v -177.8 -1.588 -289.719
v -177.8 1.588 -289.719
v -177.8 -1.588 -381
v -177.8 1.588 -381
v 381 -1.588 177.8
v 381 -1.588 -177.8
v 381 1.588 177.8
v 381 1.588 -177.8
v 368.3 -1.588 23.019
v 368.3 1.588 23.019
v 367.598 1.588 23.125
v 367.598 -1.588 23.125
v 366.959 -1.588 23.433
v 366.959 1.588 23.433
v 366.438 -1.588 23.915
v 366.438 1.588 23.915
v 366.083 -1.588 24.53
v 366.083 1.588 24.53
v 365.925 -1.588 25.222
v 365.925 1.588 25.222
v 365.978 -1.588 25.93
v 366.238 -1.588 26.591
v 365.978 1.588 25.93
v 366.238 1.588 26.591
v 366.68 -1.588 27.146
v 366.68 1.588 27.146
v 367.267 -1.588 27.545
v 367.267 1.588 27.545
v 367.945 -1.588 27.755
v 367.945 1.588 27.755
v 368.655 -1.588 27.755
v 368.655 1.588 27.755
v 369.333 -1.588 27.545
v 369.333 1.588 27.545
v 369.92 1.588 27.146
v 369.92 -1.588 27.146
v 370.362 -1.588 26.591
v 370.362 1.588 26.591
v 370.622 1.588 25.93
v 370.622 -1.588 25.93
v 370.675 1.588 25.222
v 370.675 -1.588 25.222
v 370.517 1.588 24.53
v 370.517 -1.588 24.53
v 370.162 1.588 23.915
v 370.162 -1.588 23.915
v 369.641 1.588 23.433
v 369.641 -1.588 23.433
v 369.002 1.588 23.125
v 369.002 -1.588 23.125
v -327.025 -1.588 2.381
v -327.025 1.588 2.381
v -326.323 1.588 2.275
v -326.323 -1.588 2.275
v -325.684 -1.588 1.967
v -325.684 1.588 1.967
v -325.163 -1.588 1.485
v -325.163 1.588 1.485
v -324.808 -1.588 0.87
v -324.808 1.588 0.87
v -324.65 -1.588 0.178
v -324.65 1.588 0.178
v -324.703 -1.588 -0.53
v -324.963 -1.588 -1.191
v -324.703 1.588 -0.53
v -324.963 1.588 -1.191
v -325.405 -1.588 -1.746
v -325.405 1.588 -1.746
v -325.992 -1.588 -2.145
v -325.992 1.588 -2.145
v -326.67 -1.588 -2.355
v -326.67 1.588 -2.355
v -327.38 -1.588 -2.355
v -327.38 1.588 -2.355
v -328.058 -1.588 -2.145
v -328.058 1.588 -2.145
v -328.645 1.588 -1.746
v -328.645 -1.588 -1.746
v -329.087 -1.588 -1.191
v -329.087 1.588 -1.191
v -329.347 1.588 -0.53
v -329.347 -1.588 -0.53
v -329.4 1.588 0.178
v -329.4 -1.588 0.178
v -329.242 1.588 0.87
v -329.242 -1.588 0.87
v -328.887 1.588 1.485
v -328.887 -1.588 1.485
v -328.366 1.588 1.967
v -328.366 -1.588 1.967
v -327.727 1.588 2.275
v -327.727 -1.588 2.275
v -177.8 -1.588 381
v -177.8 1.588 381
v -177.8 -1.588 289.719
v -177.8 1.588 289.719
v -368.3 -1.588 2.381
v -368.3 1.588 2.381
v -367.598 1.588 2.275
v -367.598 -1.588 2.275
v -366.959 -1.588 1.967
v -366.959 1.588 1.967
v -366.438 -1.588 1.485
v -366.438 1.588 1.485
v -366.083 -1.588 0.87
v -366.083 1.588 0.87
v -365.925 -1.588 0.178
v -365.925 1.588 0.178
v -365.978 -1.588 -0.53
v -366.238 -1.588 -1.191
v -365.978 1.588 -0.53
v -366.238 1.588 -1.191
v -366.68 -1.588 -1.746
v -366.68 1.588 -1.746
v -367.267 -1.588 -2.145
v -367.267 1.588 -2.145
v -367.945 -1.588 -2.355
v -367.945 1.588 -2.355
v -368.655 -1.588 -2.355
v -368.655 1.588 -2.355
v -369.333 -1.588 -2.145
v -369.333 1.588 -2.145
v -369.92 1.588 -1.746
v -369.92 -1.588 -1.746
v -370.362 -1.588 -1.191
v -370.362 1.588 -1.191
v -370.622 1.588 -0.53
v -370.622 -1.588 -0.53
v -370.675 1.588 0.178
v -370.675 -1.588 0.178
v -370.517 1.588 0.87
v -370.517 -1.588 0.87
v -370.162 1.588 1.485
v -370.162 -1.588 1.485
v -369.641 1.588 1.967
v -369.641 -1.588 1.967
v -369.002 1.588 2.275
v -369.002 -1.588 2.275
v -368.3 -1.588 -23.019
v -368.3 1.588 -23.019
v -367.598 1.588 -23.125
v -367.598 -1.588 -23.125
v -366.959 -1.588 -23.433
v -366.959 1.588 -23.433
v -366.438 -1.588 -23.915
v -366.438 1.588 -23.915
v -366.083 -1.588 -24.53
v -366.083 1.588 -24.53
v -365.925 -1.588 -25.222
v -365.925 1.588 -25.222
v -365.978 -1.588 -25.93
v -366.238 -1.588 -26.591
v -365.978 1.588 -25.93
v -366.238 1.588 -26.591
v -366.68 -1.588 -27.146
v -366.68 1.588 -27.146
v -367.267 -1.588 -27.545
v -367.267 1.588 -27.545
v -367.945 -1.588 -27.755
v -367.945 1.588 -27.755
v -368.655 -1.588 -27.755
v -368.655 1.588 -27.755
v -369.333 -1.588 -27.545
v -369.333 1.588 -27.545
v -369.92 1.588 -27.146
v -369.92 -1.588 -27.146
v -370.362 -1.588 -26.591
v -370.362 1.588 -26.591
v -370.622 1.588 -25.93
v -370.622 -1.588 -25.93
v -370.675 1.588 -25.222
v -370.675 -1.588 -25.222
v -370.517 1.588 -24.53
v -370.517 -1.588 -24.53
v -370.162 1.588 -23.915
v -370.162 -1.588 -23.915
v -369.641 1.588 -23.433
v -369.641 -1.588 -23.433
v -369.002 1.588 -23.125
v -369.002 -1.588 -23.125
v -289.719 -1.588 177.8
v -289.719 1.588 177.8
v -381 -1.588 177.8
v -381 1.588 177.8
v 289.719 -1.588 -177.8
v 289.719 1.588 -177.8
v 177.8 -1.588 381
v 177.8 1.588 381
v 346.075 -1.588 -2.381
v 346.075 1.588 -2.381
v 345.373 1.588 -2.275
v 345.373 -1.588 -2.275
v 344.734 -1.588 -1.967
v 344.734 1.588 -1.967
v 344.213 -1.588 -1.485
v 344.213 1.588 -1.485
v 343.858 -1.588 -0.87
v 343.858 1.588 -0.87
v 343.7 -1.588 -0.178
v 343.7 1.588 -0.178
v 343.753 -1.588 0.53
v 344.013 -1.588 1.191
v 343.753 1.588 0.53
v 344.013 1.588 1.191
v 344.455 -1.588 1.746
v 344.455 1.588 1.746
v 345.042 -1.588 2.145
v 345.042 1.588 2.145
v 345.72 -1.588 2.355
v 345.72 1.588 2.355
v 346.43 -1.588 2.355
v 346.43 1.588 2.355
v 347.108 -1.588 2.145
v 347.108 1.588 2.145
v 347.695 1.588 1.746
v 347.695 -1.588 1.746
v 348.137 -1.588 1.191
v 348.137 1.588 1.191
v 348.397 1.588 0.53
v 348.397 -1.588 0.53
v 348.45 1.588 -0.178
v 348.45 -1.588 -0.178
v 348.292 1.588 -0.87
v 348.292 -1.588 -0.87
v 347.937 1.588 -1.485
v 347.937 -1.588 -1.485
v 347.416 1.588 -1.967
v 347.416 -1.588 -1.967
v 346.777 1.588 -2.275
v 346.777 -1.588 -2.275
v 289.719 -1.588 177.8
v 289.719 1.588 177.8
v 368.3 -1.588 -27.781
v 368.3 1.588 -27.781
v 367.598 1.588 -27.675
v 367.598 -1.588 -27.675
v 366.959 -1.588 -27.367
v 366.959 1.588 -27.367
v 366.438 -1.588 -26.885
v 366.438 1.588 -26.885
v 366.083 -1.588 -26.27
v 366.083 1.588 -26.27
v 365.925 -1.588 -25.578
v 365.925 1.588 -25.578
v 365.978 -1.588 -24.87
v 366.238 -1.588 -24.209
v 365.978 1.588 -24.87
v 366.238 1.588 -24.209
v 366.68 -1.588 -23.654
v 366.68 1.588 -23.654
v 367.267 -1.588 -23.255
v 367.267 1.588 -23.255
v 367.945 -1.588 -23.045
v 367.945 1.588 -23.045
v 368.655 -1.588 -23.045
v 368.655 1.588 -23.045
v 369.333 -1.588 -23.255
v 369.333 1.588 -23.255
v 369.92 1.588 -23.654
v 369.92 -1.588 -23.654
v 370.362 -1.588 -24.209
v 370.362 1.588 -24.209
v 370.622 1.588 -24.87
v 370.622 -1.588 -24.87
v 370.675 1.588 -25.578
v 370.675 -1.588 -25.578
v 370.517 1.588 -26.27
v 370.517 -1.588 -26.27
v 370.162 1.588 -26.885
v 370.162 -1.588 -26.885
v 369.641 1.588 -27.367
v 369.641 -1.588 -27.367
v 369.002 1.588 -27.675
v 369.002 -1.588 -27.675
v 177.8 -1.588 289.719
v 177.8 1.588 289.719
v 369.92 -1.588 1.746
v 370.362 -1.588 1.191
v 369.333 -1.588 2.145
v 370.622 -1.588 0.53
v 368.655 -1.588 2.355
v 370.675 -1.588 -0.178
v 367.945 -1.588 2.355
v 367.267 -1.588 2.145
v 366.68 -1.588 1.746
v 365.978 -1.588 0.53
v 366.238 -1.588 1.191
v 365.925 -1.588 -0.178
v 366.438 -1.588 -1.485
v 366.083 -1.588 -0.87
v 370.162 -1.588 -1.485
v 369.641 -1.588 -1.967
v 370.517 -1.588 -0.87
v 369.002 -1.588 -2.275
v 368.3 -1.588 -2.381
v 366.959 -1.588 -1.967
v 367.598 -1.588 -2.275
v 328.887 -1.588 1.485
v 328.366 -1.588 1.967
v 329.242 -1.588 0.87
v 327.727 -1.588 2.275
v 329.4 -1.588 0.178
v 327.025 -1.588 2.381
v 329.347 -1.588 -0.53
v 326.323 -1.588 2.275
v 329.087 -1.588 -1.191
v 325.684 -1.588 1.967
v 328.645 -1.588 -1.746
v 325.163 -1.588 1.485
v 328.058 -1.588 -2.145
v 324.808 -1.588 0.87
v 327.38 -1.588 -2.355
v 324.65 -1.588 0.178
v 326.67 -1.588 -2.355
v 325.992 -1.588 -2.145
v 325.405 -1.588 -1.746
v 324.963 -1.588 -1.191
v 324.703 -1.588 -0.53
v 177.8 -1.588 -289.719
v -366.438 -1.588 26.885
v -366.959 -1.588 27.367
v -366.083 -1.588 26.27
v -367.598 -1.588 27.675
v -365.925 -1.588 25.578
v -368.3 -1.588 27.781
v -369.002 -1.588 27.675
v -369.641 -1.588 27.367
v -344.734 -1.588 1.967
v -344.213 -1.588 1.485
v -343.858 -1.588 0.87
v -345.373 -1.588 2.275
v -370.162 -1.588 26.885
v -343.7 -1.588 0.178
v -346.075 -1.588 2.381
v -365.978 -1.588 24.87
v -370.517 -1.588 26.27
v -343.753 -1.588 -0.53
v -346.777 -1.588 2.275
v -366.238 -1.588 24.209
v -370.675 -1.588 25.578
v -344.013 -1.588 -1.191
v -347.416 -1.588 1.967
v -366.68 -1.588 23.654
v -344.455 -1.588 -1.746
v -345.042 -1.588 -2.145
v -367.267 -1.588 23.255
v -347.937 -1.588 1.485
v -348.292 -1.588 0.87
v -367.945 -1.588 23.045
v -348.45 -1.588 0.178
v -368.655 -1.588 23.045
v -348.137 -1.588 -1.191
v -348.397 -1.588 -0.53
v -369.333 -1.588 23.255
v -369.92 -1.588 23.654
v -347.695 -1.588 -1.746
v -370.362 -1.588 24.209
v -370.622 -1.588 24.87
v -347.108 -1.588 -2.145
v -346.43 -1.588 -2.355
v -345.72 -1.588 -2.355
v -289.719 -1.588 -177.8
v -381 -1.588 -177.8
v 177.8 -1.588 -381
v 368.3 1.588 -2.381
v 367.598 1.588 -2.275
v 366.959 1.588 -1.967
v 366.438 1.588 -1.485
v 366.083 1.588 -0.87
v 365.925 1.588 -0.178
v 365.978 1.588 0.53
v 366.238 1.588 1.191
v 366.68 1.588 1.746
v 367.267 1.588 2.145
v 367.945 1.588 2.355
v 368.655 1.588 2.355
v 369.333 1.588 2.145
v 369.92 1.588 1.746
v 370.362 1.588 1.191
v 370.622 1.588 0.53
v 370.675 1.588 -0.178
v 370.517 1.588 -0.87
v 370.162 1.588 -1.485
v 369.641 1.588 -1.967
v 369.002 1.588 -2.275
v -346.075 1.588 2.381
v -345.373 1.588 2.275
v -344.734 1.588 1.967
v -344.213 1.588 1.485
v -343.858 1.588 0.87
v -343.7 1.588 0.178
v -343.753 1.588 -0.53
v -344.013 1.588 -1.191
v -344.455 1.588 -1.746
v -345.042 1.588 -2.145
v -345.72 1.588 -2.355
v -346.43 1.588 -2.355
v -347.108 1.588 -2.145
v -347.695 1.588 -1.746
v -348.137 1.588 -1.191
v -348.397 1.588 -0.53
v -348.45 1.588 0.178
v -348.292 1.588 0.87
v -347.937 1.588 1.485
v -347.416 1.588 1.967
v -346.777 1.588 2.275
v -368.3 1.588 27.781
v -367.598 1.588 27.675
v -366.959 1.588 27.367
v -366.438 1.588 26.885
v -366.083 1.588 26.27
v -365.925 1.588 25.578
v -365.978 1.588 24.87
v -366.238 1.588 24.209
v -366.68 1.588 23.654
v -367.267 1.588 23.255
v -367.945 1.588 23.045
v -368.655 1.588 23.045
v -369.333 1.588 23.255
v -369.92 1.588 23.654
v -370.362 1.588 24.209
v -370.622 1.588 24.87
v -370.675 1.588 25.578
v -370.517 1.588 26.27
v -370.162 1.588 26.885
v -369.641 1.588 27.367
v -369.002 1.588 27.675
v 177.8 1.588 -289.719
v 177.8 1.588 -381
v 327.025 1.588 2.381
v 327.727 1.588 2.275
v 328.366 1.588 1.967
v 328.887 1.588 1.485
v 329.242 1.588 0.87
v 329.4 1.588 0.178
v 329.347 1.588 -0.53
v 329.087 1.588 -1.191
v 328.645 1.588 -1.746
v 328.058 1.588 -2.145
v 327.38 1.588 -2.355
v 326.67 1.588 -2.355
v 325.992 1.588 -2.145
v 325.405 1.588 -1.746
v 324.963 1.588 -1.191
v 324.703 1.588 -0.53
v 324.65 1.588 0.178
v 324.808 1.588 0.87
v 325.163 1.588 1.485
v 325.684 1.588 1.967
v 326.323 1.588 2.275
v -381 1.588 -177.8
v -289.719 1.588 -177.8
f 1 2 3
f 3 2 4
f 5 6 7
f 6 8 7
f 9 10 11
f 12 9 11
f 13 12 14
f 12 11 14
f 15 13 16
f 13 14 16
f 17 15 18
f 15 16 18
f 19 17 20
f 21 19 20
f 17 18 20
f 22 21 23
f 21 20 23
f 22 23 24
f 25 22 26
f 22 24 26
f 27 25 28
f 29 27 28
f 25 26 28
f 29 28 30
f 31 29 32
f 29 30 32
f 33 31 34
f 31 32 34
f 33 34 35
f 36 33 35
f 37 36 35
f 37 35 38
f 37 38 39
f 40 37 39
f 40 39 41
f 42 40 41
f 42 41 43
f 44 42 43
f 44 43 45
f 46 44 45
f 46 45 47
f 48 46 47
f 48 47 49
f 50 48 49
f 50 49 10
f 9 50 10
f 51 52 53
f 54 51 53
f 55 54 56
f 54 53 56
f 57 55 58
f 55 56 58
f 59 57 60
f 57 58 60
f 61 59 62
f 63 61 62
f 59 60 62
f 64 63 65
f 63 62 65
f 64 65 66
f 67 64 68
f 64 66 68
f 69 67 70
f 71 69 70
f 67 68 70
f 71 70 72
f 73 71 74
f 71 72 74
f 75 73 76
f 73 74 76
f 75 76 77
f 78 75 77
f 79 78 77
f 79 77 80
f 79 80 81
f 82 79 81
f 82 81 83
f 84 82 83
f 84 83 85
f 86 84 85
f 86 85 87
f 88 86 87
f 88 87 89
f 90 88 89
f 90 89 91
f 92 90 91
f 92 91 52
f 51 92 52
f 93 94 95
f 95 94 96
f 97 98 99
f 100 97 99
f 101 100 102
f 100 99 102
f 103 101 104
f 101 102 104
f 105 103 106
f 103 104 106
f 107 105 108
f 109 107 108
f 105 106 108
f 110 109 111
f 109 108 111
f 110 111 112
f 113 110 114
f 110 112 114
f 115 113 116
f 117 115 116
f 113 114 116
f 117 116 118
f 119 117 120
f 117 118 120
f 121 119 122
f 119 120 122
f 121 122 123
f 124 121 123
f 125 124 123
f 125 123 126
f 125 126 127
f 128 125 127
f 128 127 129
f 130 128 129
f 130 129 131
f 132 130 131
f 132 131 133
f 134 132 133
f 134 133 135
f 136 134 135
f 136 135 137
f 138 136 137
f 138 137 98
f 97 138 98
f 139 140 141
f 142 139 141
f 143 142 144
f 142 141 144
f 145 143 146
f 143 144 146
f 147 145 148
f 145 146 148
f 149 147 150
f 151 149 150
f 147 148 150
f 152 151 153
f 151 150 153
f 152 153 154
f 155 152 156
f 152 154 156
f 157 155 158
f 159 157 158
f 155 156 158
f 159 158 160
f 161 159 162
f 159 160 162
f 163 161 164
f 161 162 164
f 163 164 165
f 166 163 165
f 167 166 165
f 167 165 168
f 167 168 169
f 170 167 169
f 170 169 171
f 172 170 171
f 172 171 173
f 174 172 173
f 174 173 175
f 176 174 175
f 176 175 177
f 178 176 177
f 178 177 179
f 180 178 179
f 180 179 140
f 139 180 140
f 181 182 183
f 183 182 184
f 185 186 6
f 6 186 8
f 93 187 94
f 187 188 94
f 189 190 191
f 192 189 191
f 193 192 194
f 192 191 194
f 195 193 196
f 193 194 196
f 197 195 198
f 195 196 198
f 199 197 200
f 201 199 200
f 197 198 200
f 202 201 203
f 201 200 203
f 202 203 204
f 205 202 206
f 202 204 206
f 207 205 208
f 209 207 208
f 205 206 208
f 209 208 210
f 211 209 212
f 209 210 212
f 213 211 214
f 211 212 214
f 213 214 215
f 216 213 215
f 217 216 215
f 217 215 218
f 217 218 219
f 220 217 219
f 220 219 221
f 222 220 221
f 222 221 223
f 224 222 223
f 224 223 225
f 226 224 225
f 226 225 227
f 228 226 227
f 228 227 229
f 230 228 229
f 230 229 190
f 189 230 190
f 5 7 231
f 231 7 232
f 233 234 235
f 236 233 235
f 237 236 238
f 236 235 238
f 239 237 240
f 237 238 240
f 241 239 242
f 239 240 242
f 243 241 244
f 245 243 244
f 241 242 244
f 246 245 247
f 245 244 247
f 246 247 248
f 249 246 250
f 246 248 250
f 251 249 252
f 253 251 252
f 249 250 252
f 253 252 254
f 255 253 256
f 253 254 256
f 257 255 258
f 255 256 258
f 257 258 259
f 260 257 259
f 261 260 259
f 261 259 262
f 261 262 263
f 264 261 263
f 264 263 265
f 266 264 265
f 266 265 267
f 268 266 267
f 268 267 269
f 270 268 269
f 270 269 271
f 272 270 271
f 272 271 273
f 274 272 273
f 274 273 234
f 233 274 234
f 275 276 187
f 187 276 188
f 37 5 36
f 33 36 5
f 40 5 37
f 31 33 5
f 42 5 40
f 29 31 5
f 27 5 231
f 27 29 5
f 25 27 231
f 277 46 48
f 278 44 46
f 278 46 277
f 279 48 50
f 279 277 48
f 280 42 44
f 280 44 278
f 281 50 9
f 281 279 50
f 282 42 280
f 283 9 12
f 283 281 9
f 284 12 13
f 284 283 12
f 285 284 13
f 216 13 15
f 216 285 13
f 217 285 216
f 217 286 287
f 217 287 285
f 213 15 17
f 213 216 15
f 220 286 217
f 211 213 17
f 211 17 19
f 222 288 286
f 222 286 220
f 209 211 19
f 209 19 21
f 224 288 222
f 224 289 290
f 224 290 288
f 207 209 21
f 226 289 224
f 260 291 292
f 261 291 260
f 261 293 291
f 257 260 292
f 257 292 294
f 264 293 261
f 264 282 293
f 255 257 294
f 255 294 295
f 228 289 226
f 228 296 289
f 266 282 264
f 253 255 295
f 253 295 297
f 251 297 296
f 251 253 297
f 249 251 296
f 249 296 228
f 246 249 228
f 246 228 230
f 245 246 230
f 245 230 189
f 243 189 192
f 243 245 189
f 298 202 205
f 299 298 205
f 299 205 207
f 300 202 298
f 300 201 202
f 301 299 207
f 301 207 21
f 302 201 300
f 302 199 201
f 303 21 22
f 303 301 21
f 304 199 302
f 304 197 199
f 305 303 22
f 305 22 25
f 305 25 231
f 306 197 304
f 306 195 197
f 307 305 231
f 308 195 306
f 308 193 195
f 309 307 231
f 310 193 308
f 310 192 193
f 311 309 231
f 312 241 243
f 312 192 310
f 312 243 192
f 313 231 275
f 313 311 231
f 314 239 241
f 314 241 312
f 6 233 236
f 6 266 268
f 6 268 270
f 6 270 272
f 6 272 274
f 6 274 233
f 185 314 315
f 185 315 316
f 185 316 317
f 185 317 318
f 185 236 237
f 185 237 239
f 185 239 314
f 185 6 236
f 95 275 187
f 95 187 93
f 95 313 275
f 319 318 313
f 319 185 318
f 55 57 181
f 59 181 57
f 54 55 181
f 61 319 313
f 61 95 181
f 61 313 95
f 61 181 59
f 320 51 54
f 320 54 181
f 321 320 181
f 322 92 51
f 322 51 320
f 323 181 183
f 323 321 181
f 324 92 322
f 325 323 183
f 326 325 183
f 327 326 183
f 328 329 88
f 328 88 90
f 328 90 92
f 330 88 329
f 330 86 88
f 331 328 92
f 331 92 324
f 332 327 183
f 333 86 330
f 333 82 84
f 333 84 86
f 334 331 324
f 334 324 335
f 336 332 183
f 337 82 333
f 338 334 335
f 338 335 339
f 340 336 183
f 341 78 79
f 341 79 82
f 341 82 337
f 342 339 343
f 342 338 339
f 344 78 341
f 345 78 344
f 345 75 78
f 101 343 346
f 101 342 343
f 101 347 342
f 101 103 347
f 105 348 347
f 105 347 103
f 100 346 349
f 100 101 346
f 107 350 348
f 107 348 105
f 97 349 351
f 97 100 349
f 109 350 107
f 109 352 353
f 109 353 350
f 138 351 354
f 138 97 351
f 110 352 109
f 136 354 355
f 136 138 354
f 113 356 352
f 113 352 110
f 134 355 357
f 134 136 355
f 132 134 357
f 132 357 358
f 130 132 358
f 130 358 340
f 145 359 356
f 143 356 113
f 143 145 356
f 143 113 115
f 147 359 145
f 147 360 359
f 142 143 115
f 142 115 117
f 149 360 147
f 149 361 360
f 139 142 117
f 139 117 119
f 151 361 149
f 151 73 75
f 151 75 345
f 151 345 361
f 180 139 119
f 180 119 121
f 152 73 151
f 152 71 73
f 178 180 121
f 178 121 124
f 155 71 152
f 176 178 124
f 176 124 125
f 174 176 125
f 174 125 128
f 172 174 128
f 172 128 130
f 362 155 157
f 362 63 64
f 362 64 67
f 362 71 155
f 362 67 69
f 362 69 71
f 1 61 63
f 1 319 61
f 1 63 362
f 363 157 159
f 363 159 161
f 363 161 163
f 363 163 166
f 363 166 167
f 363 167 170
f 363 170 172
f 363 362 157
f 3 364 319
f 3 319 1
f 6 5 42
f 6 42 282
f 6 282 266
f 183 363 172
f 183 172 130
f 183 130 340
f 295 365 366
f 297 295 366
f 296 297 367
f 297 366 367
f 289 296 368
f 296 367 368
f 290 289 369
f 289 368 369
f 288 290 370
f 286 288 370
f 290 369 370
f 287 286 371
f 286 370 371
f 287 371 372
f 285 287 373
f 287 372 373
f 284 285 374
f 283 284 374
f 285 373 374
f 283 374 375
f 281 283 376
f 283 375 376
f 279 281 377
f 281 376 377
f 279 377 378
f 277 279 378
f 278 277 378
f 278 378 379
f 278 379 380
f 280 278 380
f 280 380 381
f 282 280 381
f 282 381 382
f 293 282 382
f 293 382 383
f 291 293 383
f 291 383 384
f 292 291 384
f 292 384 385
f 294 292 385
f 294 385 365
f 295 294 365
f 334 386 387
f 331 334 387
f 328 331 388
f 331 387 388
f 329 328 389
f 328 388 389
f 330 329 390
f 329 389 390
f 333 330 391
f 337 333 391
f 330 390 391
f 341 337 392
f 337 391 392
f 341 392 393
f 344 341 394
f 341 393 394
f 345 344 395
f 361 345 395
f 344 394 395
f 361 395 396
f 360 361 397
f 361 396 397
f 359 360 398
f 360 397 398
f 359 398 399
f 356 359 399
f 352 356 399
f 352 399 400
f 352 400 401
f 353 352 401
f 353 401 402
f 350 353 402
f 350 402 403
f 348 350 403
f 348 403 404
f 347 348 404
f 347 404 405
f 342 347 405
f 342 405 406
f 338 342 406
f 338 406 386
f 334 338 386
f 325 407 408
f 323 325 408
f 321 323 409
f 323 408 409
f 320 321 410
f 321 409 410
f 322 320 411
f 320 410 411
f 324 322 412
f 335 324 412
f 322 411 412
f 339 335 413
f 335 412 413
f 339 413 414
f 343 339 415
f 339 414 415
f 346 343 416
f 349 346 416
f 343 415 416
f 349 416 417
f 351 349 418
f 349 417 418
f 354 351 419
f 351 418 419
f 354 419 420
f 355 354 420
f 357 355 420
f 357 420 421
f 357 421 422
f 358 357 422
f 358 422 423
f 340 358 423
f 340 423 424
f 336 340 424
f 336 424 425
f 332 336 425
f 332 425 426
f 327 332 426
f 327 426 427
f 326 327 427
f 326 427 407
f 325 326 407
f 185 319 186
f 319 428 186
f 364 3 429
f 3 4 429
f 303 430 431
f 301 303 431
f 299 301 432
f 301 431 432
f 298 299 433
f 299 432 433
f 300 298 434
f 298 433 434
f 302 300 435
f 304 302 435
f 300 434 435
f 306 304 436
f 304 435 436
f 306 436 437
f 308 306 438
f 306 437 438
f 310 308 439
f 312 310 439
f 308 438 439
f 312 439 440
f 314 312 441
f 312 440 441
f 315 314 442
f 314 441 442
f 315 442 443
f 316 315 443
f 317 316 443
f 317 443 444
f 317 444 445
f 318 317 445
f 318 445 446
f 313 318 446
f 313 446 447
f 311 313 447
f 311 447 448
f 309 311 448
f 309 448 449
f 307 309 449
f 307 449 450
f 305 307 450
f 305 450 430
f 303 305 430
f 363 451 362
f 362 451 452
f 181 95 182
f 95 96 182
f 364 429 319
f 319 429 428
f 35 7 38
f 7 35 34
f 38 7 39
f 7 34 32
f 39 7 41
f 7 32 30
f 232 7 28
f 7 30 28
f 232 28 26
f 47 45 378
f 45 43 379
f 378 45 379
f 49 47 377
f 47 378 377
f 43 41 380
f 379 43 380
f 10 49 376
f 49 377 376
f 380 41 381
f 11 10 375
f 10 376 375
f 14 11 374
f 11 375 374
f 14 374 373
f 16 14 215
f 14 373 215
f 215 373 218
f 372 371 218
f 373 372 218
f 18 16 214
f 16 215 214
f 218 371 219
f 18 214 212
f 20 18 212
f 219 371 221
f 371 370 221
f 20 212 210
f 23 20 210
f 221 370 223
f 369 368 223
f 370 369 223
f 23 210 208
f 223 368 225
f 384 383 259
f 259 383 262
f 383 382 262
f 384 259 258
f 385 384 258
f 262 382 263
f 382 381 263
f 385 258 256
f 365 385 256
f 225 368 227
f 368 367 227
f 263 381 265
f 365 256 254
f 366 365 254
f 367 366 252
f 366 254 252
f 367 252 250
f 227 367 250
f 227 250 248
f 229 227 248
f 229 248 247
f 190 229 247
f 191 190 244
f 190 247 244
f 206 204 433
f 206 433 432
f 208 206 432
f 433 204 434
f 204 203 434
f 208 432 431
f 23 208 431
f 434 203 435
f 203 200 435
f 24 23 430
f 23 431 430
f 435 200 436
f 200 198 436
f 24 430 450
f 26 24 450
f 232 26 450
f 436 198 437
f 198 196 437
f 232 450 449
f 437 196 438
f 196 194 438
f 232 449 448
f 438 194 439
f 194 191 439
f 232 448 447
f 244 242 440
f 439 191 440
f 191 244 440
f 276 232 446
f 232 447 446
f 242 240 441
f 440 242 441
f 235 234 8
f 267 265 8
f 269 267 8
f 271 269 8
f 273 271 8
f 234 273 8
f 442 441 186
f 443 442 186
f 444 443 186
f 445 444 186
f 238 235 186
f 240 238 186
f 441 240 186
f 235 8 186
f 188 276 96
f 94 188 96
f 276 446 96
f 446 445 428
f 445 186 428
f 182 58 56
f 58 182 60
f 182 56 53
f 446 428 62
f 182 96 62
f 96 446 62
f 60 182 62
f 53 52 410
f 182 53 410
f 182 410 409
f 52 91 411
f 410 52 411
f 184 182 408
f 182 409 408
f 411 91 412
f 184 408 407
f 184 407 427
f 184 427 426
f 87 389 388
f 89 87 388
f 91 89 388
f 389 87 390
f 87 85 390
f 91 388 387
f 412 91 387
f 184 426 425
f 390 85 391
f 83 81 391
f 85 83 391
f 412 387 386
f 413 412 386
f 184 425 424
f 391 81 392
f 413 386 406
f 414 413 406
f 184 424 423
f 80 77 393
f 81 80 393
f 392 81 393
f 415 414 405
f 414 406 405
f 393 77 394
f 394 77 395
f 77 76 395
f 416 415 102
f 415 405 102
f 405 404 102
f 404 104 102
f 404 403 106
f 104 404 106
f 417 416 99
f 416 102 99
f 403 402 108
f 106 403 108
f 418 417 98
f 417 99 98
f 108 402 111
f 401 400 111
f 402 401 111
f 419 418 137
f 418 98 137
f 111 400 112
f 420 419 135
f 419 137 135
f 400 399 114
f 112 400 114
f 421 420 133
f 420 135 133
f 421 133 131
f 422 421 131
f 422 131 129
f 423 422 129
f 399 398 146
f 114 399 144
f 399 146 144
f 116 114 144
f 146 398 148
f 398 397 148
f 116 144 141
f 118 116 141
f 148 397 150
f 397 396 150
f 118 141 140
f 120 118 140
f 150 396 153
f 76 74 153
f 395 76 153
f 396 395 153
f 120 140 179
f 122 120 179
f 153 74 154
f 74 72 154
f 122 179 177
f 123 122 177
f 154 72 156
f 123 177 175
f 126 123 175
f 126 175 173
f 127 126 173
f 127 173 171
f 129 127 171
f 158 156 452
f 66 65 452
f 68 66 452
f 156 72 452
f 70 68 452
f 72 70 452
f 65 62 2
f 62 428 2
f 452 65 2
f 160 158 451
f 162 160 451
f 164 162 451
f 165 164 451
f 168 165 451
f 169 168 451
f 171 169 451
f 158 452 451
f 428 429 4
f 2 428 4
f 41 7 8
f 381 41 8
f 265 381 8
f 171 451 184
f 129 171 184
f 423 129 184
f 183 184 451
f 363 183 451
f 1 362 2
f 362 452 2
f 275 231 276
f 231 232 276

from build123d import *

# Parameters (mm, degrees)
BOSS_EXTRUDE1_DEPTH = 1.5875
SKETCH2_R           = 2.38125
CUT_EXTRUDE1_DEPTH  = 539.824721616


with BuildPart() as part:
    # Sketch1 → Boss-Extrude1 (new, symmetric)
    with BuildSketch(Plane(origin=(0, 0, 0), x_dir=(1, 0, 0), z_dir=(0, 1, 0))):
        Polygon((-381, 177.8), (-289.71875, 177.8), (-177.8, 289.71875), (-177.8, 381), (177.8, 381), (177.8, 289.71875), (289.71875, 177.8), (381, 177.8), (381, -177.8), (289.71875, -177.8), (177.8, -289.71875), (177.8, -381), (-177.8, -381), (-177.8, -289.71875), (-289.71875, -177.8), (-381, -177.8), align=None)
    extrude(amount=BOSS_EXTRUDE1_DEPTH, both=True)

    # Sketch2 → Cut-Extrude1 (cut, through all)
    with BuildSketch(Plane(origin=(0, 1.5875, 0), x_dir=(1, 0, 0), z_dir=(0, 1, 0))):
        with Locations(Location((-346.075, 0, 0), (0, 0, 270))):
            Circle(SKETCH2_R)
        with Locations(Location((-368.3, 0, 0), (0, 0, 270))):
            Circle(SKETCH2_R)
        with Locations(Location((-368.3, 25.4, 0), (0, 0, 270))):
            Circle(SKETCH2_R)
        with Locations(Location((-368.3, -25.4, 0), (0, 0, 270))):
            Circle(SKETCH2_R)
        with Locations(Location((368.3, -25.4, 0), (0, 0, 90))):
            Circle(SKETCH2_R)
        with Locations(Location((368.3, 25.4, 0), (0, 0, 90))):
            Circle(SKETCH2_R)
        with Locations(Location((368.3, 0, 0), (0, 0, 90))):
            Circle(SKETCH2_R)
        with Locations(Location((346.075, 0, 0), (0, 0, 90))):
            Circle(SKETCH2_R)
        with Locations(Location((-327.025, 0, 0), (0, 0, 270))):
            Circle(SKETCH2_R)
        with Locations(Location((327.025, 0, 0), (0, 0, 270))):
            Circle(SKETCH2_R)
    extrude(amount=-CUT_EXTRUDE1_DEPTH, mode=Mode.SUBTRACT)


solid = part.part
